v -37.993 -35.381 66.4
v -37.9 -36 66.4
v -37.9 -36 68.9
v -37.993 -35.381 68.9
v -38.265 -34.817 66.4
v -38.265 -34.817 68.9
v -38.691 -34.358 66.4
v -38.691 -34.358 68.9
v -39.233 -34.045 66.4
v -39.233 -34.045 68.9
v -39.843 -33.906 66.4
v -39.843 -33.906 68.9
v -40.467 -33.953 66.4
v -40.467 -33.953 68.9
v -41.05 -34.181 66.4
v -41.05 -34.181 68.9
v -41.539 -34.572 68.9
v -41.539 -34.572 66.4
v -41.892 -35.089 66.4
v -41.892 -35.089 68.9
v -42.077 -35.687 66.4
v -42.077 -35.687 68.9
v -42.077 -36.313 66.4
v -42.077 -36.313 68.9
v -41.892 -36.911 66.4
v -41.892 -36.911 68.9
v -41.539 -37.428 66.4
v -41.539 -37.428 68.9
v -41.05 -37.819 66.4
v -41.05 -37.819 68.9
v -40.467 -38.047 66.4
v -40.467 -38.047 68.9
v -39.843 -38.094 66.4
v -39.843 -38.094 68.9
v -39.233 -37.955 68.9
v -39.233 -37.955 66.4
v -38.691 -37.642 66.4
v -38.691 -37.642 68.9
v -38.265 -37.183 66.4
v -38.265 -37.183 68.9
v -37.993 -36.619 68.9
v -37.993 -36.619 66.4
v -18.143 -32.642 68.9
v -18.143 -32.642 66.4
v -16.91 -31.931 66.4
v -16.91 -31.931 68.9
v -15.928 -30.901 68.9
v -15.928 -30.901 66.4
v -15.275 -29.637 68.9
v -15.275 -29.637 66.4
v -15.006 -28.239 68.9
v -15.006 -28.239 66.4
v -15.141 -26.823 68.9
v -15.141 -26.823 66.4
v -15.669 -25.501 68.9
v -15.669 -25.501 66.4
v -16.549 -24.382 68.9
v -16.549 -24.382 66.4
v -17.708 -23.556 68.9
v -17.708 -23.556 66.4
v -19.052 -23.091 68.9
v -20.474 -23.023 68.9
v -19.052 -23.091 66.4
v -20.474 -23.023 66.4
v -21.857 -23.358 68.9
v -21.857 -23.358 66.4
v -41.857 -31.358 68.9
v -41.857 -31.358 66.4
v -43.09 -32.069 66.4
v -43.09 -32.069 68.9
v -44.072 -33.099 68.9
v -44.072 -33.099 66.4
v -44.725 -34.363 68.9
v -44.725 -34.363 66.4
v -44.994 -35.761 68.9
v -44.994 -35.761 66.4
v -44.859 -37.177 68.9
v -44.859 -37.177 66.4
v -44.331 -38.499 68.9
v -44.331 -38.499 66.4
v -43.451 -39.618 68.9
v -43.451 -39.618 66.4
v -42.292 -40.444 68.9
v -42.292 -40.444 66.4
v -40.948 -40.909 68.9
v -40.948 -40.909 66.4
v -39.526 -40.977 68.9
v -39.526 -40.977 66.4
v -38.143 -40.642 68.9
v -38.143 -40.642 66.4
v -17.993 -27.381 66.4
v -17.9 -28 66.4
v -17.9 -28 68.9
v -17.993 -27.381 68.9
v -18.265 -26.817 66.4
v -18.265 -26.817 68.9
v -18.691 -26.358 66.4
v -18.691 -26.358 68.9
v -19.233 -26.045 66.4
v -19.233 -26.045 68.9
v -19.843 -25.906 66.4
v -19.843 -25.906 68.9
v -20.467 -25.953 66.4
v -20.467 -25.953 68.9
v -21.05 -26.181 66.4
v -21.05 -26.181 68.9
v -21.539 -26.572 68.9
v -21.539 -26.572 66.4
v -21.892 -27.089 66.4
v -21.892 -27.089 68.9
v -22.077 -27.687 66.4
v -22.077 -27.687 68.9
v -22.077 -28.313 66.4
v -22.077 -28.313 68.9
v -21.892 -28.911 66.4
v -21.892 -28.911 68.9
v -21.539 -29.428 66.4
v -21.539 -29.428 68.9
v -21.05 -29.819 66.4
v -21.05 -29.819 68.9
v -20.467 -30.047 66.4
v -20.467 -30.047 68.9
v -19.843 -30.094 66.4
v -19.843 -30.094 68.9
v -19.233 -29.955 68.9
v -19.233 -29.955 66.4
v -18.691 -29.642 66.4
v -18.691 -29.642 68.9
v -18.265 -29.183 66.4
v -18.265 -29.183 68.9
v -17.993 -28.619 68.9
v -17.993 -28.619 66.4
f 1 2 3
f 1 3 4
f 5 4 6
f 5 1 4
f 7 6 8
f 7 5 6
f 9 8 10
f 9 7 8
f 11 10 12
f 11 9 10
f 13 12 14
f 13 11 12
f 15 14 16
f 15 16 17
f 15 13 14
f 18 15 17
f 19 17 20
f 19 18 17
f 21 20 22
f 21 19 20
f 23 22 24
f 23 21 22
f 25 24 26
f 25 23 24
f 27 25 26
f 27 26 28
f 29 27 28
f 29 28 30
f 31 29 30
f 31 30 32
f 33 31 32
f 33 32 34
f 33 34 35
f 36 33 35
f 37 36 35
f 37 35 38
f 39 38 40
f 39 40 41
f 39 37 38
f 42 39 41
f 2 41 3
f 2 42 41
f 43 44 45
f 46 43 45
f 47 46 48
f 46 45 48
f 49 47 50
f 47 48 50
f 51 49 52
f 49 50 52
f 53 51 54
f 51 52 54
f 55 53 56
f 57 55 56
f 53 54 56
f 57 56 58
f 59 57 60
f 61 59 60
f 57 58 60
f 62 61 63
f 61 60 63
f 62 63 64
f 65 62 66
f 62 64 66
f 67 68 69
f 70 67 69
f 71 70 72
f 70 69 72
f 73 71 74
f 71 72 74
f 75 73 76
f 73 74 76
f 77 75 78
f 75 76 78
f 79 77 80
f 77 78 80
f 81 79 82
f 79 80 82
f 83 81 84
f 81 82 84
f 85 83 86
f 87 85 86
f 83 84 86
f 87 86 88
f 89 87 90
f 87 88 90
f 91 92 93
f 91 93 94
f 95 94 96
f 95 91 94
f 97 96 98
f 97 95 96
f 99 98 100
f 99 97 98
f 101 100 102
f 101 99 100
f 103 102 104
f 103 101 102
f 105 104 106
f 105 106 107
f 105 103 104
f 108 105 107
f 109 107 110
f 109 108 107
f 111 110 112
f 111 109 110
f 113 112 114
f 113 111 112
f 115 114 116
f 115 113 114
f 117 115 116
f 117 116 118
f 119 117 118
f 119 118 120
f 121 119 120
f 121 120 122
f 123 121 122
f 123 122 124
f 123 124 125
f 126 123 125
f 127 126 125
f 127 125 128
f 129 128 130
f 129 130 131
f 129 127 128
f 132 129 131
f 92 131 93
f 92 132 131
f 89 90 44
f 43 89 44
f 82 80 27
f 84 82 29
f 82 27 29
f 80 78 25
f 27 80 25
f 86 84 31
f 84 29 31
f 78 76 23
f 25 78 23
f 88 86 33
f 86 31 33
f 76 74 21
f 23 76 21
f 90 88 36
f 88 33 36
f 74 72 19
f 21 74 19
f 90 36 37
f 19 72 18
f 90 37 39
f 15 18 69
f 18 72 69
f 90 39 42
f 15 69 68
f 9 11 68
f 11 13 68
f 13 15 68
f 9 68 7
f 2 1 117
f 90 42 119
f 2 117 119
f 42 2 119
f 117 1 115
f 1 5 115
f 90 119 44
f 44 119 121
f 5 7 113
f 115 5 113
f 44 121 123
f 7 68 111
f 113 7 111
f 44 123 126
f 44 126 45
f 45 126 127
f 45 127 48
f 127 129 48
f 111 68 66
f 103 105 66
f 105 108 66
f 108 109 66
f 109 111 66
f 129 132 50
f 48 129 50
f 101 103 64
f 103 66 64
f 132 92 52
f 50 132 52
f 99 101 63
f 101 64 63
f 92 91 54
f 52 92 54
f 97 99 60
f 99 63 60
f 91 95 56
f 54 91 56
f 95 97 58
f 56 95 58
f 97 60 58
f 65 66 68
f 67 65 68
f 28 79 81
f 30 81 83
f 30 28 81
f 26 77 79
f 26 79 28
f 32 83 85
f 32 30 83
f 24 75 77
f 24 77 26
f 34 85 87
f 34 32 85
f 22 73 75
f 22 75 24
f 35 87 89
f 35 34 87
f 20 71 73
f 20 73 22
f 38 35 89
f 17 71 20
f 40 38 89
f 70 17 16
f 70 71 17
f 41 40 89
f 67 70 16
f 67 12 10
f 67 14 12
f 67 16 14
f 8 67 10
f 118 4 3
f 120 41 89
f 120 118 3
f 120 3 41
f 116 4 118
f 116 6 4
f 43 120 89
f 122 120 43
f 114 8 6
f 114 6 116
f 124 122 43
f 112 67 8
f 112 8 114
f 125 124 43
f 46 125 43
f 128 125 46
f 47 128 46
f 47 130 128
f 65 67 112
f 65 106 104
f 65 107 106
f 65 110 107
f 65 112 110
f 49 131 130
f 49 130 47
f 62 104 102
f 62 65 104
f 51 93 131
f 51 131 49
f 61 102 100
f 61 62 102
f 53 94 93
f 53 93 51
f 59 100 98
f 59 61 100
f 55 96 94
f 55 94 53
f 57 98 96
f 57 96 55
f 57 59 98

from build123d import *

# Parameters (mm, degrees)
SK_BIELA_EXTERIOR_R  = 2.1
BIELA_EXTERIOR_DEPTH = 2.5


with BuildPart() as part:
    # Sk_Biela_exterior → Biela_exterior (new body)
    with BuildSketch(Plane.XY.offset(66.4)):
        with BuildLine():
            Line((-38.143046618, -40.642383454), (-18.143046618, -32.642383454))
            ThreePointArc((-18.143046618, -32.642383454), (-15.357616546, -26.143046618), (-21.856953382, -23.357616546))
            Line((-21.856953382, -23.357616546), (-41.856953382, -31.357616546))
            ThreePointArc((-41.856953382, -31.357616546), (-44.642383454, -37.856953382), (-38.143046618, -40.642383454))
        make_face()
        with Locations((-20, -28)):
            Circle(SK_BIELA_EXTERIOR_R, mode=Mode.SUBTRACT)
        with Locations((-40, -36)):
            Circle(SK_BIELA_EXTERIOR_R, mode=Mode.SUBTRACT)
    extrude(amount=BIELA_EXTERIOR_DEPTH)


solid = part.part
